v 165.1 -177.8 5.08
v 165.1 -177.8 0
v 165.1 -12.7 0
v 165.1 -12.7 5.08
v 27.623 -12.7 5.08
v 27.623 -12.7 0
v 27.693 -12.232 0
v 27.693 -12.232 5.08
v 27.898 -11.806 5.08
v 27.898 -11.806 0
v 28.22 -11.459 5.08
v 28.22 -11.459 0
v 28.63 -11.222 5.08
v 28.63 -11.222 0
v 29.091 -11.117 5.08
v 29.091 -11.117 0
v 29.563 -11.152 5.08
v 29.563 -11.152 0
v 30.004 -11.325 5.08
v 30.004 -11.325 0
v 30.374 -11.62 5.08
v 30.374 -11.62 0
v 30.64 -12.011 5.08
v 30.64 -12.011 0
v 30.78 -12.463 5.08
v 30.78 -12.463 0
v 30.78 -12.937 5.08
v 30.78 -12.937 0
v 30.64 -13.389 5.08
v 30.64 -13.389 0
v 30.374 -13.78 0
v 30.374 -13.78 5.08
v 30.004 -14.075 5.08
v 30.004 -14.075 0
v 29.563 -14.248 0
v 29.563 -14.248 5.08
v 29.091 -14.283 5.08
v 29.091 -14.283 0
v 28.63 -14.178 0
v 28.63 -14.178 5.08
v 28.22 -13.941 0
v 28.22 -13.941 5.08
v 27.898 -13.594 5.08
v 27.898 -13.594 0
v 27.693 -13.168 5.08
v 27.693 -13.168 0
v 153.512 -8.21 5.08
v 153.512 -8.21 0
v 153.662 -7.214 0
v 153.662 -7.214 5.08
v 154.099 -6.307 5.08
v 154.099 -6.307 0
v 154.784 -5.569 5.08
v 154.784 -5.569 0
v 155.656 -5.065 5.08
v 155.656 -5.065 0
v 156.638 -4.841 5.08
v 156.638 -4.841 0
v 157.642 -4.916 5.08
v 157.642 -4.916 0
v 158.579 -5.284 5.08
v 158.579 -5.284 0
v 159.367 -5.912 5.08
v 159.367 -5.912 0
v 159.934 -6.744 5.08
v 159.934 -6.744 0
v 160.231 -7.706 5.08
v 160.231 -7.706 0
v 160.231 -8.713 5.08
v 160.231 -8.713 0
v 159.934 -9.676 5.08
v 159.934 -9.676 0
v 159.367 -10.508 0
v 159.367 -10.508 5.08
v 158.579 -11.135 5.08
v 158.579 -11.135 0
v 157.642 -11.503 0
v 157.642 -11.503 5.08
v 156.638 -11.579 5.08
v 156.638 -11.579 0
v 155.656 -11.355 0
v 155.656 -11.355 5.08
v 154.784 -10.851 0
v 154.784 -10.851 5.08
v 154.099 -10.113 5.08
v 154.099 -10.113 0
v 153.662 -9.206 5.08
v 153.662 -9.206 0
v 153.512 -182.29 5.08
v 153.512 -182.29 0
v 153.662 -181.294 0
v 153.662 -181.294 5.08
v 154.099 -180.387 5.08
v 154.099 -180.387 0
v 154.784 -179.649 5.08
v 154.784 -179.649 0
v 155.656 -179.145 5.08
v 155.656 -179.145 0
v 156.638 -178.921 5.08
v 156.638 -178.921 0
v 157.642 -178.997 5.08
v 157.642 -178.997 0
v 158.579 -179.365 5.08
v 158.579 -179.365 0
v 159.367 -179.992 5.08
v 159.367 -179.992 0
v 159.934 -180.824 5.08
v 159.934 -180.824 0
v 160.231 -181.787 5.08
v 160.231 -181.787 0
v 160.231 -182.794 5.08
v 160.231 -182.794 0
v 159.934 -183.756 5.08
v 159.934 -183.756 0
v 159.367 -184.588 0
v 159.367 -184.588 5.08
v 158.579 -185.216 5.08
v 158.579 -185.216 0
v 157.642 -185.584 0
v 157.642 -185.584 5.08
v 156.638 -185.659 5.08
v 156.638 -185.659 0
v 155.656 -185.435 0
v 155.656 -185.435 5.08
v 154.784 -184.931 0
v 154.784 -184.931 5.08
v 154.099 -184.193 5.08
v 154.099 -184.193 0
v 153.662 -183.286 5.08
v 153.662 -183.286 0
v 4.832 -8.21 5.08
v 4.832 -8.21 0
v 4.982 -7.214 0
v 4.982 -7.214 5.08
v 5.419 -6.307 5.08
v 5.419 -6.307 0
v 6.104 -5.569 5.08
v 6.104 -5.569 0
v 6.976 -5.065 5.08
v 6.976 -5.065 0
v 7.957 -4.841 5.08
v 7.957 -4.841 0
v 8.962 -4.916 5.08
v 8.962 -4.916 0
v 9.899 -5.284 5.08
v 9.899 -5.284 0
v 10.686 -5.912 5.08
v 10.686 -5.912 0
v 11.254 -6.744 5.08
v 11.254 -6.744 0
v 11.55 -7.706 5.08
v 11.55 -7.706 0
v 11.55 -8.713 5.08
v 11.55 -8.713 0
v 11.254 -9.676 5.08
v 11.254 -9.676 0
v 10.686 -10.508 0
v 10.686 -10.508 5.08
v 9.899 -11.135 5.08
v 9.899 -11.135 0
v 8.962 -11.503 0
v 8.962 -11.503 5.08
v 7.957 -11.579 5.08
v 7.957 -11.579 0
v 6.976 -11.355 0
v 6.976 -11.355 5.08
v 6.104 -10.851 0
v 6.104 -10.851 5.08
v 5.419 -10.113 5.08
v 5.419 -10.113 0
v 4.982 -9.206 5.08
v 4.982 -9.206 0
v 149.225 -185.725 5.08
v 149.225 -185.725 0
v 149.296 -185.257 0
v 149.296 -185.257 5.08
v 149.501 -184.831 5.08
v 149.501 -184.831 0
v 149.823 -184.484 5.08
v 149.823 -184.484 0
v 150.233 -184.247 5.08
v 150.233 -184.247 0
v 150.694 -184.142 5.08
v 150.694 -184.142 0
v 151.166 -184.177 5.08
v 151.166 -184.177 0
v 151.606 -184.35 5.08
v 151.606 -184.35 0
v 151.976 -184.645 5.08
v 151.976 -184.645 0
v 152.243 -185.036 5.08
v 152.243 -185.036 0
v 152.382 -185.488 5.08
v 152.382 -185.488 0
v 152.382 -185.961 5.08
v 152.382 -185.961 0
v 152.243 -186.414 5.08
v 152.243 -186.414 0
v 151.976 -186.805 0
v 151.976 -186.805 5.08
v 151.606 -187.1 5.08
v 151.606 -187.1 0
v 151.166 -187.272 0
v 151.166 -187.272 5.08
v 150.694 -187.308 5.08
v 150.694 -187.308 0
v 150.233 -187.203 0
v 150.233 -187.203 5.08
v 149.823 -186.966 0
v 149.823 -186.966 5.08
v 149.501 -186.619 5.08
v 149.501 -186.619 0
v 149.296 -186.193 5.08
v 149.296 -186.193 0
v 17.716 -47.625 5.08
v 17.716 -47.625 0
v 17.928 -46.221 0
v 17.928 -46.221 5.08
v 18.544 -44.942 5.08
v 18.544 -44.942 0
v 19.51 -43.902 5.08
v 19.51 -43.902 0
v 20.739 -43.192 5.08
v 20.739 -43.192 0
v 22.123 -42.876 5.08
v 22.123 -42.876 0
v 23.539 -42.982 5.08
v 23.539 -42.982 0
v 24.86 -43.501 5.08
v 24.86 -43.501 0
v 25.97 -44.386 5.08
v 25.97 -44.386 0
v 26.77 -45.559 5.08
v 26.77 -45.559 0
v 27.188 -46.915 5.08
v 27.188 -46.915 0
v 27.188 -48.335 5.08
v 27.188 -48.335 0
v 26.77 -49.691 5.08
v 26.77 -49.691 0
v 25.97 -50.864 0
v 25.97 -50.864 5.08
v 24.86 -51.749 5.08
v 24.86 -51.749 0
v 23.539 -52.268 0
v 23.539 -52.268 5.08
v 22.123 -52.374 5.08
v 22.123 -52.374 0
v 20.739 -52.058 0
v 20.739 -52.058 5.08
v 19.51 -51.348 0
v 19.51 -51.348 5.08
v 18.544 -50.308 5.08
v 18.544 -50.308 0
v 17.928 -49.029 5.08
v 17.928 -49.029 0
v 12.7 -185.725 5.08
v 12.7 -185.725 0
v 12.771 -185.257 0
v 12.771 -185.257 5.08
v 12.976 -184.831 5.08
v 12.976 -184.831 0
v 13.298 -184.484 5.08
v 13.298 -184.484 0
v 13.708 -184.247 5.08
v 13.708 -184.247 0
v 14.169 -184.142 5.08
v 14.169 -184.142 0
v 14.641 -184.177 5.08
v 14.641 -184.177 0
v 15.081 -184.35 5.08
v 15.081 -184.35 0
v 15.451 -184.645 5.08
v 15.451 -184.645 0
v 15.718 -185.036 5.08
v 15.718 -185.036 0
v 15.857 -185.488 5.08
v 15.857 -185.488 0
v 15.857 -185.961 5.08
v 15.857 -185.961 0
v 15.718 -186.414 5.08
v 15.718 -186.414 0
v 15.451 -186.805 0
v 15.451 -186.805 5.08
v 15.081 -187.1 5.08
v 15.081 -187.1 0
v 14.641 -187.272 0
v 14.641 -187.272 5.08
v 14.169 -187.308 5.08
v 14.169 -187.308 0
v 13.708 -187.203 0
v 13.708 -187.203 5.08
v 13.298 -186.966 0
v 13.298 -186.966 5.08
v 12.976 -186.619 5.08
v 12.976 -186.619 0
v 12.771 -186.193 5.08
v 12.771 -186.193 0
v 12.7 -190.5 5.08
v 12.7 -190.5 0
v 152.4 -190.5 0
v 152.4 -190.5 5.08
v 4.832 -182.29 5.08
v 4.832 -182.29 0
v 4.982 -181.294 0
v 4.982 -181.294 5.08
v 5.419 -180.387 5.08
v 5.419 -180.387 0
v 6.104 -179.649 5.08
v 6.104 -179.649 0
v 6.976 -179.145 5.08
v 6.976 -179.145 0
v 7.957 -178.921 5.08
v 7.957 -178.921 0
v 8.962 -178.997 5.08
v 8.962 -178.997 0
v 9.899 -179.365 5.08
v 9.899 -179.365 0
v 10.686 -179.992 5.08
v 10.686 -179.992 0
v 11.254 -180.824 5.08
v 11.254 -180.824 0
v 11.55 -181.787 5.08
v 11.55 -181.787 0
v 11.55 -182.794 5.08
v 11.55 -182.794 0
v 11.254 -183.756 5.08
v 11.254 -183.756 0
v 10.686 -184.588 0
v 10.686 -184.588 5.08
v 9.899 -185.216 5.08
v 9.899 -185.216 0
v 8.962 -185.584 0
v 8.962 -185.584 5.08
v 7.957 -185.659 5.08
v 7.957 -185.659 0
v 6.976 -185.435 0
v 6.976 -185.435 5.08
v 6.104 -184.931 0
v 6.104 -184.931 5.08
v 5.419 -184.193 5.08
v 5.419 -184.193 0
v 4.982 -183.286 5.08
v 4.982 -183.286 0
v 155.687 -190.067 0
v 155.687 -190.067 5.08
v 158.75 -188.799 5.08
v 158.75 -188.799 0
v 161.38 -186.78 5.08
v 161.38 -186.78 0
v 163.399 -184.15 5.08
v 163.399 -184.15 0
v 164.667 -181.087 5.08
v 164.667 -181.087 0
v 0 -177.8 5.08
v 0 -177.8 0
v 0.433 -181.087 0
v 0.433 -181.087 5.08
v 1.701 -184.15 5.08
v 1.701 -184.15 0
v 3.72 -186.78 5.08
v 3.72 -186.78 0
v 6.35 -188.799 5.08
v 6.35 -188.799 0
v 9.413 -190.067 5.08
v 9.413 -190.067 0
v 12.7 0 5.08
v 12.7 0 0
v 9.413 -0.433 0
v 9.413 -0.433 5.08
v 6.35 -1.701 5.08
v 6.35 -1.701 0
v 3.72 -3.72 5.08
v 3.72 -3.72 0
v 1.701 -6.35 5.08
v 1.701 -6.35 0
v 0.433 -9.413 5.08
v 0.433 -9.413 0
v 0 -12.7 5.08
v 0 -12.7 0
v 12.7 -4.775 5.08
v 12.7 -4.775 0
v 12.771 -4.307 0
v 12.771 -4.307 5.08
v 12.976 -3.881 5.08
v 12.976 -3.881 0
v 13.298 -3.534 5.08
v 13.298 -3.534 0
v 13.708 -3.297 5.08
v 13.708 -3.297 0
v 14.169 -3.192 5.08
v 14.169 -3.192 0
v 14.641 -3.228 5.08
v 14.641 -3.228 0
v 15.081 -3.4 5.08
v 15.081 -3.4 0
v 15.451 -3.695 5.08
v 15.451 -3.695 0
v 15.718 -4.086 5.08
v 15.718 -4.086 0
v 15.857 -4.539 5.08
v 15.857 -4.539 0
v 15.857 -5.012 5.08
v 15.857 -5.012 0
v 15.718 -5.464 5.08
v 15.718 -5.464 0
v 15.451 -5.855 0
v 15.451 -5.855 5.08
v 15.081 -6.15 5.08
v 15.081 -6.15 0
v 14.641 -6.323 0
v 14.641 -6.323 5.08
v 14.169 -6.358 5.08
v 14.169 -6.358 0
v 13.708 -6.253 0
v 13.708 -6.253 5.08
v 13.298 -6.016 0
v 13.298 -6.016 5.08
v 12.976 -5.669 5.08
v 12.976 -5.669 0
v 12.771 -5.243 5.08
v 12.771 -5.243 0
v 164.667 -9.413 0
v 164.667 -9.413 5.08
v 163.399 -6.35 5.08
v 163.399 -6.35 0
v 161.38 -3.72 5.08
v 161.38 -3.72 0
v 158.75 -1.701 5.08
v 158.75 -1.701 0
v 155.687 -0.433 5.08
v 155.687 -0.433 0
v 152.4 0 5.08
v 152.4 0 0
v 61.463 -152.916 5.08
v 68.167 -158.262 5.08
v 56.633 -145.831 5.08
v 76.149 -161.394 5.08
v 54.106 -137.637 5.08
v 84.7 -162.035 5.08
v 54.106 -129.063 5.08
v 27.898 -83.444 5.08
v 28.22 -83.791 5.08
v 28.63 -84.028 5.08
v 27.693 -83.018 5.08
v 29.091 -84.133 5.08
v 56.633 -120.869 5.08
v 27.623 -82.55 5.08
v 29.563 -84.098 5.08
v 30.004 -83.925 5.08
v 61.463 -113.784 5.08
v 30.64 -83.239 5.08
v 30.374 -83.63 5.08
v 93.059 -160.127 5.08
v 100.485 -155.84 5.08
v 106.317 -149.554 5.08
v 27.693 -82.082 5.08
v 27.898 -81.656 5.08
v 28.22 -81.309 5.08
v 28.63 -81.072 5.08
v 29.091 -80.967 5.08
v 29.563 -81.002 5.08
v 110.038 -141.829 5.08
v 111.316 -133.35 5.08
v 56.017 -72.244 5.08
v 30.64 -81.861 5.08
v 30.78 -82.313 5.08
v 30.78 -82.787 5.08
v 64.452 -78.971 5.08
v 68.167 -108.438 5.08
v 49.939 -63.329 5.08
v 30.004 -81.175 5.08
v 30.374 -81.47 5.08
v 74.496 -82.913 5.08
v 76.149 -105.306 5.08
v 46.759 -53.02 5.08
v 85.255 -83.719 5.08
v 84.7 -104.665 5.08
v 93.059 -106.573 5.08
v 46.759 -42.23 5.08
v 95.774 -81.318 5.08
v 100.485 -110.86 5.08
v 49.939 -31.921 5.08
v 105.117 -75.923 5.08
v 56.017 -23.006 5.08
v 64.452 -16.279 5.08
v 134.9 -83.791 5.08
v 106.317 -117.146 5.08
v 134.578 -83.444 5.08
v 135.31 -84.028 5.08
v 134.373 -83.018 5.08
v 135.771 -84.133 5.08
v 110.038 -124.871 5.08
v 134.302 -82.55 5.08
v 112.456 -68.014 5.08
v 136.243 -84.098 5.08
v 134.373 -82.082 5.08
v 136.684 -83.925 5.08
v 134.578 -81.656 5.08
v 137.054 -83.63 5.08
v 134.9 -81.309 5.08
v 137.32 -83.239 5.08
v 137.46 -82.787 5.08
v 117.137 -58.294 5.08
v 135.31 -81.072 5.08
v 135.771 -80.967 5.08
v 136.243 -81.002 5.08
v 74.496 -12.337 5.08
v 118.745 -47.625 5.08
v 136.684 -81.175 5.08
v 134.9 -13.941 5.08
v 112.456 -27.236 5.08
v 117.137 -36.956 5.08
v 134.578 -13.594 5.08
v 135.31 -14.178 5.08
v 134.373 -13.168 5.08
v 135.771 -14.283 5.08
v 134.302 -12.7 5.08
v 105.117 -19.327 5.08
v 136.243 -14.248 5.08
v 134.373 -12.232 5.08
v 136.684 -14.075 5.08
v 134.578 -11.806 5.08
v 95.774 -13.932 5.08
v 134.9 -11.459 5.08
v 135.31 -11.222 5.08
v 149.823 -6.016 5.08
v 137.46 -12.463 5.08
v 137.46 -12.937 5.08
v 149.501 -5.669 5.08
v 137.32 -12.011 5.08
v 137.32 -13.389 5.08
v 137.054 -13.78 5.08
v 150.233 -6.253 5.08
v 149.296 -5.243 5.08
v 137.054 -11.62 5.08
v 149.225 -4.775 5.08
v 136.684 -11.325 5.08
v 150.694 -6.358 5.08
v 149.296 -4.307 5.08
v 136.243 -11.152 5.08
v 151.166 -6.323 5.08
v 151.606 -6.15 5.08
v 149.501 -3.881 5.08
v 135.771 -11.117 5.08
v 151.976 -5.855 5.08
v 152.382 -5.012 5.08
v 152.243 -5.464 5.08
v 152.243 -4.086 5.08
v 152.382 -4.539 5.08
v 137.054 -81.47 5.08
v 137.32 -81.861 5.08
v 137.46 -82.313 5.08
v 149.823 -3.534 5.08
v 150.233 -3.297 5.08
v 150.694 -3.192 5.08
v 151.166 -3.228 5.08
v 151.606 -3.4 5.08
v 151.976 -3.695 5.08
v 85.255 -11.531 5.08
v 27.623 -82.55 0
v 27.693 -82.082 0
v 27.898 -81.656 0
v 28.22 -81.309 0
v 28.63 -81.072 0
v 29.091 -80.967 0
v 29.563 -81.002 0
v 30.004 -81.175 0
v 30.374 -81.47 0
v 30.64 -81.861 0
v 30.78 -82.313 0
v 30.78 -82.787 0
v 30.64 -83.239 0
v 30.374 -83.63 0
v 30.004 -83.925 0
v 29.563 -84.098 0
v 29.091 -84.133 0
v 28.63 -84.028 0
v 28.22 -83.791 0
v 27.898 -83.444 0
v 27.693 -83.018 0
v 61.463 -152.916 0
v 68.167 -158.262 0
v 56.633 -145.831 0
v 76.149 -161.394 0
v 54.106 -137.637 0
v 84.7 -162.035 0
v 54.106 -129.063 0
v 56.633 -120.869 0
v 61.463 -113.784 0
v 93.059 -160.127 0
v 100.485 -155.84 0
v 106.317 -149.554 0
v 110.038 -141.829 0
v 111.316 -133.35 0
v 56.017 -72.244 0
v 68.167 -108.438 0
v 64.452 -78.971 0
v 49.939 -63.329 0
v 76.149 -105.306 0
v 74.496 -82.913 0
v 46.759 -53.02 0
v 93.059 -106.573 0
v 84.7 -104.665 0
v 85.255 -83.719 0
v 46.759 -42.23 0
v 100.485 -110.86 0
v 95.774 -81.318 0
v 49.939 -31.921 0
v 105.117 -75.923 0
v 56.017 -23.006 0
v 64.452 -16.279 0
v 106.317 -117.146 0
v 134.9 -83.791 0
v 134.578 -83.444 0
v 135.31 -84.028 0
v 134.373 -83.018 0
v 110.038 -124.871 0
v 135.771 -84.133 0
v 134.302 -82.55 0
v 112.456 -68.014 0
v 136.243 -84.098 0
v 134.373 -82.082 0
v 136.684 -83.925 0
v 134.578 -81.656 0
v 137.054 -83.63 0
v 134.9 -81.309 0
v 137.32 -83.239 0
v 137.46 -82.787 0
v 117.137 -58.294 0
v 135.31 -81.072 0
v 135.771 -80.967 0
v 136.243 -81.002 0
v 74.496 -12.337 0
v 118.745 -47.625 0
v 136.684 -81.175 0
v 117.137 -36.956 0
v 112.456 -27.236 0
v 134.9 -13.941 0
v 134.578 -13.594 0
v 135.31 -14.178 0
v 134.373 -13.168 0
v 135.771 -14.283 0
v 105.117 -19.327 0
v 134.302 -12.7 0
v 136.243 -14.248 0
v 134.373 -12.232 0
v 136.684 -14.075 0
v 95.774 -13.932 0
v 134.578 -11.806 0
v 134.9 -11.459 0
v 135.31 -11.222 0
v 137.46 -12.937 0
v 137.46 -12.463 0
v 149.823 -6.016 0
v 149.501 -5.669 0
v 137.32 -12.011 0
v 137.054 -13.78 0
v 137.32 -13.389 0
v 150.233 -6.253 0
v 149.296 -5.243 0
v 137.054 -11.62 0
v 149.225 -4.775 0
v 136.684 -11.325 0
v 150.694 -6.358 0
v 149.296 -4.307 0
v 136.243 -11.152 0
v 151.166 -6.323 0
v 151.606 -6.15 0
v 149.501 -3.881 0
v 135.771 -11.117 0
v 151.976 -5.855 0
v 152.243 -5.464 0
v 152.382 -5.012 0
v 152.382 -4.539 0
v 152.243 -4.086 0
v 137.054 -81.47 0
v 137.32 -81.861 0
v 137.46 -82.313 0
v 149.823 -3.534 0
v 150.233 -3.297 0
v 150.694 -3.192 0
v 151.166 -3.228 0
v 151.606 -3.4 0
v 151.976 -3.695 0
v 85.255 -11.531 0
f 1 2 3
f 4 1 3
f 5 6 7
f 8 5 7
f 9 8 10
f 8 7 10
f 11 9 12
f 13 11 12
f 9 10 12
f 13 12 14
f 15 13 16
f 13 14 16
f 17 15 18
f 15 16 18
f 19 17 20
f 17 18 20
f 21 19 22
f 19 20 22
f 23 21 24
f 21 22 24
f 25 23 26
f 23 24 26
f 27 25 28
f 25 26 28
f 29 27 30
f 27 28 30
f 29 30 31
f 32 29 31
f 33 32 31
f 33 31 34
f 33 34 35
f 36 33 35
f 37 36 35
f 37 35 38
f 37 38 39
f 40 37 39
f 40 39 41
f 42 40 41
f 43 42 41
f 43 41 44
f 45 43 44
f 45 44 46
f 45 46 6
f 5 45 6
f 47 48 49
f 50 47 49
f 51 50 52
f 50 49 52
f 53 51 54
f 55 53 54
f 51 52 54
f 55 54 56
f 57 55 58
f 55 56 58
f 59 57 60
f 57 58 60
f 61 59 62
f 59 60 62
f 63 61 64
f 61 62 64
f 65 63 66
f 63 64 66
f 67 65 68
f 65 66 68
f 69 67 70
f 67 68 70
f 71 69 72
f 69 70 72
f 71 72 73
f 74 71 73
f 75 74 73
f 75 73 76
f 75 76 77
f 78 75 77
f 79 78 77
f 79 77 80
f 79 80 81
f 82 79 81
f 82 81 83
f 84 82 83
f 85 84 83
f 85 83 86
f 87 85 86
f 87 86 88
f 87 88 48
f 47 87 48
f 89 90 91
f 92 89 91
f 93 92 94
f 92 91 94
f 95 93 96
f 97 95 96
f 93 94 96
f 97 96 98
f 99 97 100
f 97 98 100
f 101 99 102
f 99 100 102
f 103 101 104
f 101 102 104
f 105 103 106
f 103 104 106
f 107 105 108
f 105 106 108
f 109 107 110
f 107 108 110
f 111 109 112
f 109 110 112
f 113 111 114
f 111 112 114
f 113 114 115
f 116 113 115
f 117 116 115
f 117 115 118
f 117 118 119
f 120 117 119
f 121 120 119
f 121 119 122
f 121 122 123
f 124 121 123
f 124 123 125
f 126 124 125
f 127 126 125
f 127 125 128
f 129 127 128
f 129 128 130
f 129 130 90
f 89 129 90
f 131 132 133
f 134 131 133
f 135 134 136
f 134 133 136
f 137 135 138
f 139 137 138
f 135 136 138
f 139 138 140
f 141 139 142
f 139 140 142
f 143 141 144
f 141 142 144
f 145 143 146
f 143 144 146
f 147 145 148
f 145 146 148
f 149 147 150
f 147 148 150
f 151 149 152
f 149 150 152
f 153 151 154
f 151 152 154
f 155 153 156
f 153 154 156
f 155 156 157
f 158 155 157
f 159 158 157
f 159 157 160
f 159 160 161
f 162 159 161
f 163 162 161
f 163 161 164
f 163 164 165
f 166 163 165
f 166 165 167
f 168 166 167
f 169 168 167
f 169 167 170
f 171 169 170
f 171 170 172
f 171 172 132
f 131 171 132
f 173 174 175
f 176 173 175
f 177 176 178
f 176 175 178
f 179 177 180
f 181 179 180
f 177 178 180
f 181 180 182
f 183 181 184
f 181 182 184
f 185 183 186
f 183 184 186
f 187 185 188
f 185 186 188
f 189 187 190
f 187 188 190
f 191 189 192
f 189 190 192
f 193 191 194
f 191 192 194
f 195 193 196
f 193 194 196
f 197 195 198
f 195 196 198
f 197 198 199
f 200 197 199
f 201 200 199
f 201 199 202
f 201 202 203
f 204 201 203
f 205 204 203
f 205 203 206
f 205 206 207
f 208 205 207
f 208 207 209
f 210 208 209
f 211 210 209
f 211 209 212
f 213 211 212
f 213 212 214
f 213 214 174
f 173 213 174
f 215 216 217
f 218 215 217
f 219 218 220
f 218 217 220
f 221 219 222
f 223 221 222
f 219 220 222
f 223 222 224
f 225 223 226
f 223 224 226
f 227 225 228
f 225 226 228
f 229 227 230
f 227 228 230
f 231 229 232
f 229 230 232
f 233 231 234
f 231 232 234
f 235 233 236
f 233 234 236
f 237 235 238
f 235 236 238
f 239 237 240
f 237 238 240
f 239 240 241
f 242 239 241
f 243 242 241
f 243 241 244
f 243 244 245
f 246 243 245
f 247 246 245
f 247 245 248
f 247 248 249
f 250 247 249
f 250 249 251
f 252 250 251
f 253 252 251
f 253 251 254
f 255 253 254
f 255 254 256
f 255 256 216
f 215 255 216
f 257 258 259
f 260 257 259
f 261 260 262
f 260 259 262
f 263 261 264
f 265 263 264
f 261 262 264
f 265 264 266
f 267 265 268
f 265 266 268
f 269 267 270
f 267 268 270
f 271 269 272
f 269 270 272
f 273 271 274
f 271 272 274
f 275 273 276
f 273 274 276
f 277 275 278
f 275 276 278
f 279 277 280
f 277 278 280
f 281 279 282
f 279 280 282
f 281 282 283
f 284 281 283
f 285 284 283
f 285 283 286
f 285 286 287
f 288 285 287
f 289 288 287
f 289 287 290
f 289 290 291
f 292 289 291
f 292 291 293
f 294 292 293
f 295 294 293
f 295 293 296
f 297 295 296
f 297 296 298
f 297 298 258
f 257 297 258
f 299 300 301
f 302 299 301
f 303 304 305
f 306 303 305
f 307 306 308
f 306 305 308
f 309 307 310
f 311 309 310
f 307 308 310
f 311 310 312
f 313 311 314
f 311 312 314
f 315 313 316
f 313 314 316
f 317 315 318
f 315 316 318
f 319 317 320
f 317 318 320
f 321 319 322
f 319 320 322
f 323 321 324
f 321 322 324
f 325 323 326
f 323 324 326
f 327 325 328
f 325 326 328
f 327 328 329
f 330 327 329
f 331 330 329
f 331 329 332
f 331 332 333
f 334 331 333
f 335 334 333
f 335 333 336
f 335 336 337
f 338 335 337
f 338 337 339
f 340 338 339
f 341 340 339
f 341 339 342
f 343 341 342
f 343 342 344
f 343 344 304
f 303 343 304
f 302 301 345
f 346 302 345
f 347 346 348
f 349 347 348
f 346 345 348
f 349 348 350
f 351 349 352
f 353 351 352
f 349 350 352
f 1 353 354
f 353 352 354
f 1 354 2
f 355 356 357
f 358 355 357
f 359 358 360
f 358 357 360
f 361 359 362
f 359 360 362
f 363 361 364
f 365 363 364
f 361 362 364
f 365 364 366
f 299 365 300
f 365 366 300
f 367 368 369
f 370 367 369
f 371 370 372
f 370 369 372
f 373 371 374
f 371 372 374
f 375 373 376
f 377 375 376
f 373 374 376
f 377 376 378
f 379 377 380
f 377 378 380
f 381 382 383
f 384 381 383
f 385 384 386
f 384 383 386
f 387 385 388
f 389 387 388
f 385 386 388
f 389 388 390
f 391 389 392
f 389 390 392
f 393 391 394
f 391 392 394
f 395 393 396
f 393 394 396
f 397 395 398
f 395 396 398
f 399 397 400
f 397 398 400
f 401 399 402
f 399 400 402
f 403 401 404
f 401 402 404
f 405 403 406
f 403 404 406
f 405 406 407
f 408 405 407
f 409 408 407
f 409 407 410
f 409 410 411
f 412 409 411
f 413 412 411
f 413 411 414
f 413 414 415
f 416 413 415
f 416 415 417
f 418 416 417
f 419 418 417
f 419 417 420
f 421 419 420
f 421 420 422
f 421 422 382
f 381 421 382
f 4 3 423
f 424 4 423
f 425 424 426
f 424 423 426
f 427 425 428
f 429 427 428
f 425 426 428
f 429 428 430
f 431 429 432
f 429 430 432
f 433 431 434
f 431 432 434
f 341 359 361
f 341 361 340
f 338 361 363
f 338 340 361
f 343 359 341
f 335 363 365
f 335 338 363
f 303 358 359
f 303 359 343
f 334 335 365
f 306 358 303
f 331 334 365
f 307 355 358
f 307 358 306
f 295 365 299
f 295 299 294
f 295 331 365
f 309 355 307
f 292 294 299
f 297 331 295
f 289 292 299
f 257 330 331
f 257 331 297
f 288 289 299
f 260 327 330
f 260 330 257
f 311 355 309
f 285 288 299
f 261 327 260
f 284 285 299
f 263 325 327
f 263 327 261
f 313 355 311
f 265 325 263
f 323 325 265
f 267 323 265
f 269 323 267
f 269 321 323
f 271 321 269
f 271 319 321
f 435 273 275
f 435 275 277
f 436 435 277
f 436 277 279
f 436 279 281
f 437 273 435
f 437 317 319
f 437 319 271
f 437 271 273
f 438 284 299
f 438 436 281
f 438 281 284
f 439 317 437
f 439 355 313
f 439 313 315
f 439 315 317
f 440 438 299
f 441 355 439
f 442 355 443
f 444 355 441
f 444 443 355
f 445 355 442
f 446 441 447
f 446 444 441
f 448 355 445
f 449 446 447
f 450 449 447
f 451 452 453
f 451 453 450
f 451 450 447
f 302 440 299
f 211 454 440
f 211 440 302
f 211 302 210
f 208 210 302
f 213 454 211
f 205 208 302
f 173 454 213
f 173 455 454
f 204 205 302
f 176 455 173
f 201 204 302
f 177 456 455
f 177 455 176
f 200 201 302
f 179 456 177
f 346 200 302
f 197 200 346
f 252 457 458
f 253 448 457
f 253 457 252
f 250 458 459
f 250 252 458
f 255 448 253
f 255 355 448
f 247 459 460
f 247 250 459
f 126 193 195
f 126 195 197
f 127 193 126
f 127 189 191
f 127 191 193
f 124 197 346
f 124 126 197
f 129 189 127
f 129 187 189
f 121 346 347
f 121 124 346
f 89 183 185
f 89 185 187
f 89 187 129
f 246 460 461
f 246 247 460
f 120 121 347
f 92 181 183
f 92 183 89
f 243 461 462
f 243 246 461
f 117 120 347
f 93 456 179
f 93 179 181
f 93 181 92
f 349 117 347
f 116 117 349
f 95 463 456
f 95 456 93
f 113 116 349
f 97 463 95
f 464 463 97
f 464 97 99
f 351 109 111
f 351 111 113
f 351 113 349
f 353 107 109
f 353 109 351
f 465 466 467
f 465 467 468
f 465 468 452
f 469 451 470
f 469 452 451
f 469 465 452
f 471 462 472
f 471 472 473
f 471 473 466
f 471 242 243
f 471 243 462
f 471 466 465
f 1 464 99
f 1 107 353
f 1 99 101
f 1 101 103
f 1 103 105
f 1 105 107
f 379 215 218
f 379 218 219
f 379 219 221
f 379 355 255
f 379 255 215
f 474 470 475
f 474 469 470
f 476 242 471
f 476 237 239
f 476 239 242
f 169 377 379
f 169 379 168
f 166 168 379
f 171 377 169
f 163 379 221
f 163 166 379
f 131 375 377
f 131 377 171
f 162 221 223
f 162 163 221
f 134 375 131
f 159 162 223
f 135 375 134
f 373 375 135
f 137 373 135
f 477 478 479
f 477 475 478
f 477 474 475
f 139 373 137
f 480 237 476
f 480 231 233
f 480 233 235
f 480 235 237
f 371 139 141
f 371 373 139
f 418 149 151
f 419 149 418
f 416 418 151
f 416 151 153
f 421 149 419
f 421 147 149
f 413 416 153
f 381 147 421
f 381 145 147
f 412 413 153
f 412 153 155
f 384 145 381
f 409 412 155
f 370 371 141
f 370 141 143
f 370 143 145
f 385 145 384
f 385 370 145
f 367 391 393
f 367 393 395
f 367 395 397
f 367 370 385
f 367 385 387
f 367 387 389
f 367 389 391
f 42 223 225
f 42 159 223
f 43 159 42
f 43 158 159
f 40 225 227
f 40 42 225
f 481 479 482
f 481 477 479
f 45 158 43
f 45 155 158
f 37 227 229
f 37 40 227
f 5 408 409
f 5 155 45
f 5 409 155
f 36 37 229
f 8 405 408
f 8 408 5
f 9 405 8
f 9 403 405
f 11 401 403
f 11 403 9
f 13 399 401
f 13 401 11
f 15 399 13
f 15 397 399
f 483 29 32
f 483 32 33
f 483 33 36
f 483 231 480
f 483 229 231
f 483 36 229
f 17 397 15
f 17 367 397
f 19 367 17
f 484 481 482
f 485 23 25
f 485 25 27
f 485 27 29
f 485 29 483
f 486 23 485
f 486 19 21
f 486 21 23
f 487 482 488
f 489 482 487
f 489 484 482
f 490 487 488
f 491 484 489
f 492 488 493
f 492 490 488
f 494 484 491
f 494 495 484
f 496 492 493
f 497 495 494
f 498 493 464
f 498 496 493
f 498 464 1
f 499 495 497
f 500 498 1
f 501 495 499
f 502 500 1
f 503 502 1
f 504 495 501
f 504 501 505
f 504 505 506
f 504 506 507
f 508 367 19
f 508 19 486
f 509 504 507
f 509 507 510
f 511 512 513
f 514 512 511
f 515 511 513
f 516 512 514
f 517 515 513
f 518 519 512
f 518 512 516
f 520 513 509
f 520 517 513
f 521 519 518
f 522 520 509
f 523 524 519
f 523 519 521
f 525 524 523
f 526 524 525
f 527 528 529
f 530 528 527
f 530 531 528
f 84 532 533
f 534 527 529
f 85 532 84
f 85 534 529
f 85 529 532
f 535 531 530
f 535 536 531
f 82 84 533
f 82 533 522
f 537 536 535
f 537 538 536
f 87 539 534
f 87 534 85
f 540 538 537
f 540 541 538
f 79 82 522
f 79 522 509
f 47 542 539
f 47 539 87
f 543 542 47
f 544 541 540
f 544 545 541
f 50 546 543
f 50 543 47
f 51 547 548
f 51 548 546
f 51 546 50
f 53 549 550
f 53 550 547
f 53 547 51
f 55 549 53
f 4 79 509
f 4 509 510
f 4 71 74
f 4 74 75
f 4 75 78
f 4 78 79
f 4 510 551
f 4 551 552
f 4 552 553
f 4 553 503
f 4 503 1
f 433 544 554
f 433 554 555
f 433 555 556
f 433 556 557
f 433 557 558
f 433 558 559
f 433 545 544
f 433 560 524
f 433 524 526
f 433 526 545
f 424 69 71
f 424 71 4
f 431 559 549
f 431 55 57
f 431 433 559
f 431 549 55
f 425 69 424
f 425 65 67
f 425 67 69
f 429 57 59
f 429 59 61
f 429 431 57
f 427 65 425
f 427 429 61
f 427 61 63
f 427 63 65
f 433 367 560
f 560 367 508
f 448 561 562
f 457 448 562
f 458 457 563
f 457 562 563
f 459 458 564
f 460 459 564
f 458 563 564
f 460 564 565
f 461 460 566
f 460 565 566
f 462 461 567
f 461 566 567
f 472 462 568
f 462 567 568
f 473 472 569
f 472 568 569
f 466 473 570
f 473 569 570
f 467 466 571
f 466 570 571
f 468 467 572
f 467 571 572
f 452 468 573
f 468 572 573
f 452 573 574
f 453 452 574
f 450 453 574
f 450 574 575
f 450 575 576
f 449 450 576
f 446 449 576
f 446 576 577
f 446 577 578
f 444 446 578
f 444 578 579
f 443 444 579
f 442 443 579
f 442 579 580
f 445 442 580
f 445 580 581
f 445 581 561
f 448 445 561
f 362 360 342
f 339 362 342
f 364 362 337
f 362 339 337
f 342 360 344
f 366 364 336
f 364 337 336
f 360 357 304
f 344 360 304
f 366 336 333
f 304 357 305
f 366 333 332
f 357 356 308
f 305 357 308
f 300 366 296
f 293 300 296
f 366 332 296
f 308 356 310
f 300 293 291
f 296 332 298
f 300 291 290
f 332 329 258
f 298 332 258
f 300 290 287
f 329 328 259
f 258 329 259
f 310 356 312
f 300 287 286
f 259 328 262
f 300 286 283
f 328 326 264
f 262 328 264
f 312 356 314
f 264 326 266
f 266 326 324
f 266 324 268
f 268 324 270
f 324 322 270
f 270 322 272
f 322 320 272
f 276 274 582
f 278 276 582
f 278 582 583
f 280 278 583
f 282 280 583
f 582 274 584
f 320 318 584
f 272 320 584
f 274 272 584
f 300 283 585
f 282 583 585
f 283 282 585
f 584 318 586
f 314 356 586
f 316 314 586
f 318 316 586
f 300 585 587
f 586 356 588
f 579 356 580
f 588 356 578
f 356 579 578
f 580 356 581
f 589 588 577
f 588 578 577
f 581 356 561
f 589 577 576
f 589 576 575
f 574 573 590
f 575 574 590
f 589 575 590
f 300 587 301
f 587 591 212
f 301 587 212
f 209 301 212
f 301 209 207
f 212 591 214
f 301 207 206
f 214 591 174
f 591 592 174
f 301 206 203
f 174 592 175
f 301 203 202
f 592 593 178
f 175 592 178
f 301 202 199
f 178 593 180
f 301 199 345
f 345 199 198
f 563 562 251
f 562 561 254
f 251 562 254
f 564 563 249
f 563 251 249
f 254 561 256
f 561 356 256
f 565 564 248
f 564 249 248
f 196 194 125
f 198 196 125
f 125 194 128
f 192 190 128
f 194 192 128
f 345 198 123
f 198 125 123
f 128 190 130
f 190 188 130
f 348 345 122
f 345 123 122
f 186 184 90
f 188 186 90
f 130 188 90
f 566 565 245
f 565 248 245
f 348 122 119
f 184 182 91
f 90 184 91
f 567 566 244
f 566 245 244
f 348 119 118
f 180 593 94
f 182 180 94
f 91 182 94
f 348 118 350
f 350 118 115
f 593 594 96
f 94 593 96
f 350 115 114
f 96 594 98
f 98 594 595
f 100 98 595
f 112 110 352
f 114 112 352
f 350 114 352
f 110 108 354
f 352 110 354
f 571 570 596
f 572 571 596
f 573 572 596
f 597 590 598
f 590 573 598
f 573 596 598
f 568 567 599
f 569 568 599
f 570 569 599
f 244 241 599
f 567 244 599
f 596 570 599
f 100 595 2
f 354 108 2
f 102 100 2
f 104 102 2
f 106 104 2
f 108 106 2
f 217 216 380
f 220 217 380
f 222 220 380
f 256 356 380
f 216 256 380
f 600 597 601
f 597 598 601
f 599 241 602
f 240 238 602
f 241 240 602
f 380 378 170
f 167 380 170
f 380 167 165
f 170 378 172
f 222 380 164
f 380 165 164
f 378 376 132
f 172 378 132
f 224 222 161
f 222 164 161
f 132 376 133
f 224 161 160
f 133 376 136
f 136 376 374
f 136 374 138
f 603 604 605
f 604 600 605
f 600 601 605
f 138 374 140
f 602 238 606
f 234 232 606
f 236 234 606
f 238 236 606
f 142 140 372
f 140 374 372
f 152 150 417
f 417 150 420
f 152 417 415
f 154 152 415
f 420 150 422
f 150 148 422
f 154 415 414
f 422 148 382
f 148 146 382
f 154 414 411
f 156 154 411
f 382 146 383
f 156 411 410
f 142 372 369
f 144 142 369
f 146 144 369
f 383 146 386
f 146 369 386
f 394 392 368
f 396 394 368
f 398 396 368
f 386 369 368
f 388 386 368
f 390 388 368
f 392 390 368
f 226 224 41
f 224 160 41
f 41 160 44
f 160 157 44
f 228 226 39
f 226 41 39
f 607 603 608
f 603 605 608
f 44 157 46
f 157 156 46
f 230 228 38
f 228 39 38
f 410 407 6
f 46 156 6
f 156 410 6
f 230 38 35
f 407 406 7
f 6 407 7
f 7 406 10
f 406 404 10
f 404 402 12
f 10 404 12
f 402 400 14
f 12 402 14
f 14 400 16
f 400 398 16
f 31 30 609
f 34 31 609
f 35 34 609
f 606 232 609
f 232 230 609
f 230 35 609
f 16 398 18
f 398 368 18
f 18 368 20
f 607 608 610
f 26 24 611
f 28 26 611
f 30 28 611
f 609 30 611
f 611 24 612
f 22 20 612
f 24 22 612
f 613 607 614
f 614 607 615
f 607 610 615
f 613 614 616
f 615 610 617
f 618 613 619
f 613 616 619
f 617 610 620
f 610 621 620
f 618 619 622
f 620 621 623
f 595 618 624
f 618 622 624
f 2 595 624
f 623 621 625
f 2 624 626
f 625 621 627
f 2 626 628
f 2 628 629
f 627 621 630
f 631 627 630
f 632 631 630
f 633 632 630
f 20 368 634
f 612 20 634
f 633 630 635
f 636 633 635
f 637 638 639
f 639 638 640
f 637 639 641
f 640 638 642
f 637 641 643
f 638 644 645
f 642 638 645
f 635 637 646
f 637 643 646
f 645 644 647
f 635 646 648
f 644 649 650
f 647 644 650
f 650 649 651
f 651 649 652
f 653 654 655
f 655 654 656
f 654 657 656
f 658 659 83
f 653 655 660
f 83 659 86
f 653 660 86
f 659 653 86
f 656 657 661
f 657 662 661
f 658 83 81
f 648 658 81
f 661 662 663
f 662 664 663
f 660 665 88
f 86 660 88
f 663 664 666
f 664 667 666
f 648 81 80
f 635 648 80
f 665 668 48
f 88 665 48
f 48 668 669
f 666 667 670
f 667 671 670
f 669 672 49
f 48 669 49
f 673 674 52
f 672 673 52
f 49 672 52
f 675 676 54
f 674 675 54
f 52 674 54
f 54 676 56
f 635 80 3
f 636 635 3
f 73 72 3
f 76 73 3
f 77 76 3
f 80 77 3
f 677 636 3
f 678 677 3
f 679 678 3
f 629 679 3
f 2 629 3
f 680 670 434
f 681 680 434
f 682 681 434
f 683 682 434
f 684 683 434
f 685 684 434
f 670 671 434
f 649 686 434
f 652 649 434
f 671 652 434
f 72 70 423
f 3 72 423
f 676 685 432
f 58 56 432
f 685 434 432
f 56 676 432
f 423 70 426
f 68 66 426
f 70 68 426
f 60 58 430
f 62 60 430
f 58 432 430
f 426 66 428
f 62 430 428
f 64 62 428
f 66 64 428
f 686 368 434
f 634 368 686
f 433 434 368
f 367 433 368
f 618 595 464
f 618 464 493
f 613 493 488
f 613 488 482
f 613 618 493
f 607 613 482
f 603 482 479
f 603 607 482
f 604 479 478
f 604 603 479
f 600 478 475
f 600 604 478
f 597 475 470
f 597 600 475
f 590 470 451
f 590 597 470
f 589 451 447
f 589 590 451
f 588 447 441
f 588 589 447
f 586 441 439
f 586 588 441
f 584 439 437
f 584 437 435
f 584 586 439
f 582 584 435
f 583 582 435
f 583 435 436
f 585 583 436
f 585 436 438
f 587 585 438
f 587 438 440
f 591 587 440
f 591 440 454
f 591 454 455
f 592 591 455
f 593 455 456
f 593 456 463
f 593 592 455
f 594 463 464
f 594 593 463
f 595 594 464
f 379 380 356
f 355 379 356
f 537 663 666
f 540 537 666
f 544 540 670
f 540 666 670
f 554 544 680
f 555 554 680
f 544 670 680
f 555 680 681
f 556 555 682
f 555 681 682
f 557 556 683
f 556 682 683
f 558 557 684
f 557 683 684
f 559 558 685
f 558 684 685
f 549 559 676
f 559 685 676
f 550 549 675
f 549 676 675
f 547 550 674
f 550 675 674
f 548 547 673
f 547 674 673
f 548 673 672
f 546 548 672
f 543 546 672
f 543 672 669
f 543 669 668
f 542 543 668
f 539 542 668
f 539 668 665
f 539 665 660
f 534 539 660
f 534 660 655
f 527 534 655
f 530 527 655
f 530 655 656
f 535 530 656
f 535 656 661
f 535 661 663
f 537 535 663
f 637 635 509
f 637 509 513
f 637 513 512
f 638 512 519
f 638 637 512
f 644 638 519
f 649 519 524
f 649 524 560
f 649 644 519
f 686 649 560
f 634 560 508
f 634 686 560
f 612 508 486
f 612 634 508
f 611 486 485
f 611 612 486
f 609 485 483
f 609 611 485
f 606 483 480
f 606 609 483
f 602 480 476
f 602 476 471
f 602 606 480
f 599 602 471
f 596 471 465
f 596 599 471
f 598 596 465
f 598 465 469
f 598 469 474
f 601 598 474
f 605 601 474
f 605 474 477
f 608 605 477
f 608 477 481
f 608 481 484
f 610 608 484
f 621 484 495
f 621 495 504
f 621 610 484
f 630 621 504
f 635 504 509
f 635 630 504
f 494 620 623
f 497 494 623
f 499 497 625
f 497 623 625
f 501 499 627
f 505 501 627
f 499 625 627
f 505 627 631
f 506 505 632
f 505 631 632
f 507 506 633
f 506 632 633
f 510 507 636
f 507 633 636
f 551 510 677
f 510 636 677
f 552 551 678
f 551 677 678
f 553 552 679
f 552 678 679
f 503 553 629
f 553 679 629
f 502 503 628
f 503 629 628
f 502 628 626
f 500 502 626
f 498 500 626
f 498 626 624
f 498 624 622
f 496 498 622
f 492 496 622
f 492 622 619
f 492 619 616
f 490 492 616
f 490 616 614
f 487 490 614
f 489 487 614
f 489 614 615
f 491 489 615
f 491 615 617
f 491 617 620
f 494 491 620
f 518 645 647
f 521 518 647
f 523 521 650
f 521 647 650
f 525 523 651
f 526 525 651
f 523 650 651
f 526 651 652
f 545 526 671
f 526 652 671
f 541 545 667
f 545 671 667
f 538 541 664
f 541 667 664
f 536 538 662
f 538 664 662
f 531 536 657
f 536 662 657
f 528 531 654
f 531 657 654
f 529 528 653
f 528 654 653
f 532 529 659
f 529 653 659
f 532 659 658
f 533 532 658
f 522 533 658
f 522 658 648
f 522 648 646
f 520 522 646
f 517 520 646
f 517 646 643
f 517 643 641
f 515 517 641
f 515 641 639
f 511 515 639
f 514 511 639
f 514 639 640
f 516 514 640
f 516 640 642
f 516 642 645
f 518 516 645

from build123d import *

# Parameters (mm, degrees)
F0_R     = 28.7655
F0_R_2   = 36.195
F1_DEPTH = 5.08
F3_D     = 6.7564
F5_D     = 3.175
F7_D     = 3.175
F9_D     = 9.525


with BuildPart() as f1:
    # F0 (on Top) → F1 (new body)
    with BuildSketch(Plane.XY):
        with BuildLine():
            Line((152.4, 0), (12.7, 0))
            ThreePointArc((12.7, 0), (3.7197438789, -3.7197438789), (0, -12.7))
            Line((0, -12.7), (0, -177.8))
            ThreePointArc((0, -177.8), (3.7197438789, -186.7802561211), (12.7, -190.5))
            Line((12.7, -190.5), (152.4, -190.5))
            ThreePointArc((152.4, -190.5), (161.3802561211, -186.7802561211), (165.1, -177.8))
            Line((165.1, -177.8), (165.1, -12.7))
            ThreePointArc((165.1, -12.7), (161.3802561211, -3.7197438789), (152.4, 0))
        make_face()
        with Locations((82.55, -133.35)):
            Circle(F0_R, mode=Mode.SUBTRACT)
        with Locations((82.55, -47.625)):
            Circle(F0_R_2, mode=Mode.SUBTRACT)
    extrude(amount=F1_DEPTH)

    # F3 (through all)
    with Locations(Plane.XY.offset(5.08)):
        with Locations((8.2098719395, -8.2098719395), (156.8901280605, -8.2098719395), (156.8901280605, -182.2901280605), (8.2098719395, -182.2901280605)):
            Hole(F3_D / 2)

    # F5 (through all)
    with Locations(Plane.XY.offset(5.08)):
        with Locations((14.2875, -185.7248), (150.8125, -185.7248), (150.8125, -4.7752), (14.2875, -4.7752)):
            Hole(F5_D / 2)

    # F7 (through all)
    with Locations(Plane.XY.offset(5.08)):
        with Locations((29.21, -82.55), (29.21, -12.7), (135.89, -12.7), (135.89, -82.55)):
            Hole(F7_D / 2)

    # F9 (through all)
    with Locations(Plane.XY.offset(5.08)):
        with Locations((22.479, -47.625)):
            Hole(F9_D / 2)


solid = f1.part
